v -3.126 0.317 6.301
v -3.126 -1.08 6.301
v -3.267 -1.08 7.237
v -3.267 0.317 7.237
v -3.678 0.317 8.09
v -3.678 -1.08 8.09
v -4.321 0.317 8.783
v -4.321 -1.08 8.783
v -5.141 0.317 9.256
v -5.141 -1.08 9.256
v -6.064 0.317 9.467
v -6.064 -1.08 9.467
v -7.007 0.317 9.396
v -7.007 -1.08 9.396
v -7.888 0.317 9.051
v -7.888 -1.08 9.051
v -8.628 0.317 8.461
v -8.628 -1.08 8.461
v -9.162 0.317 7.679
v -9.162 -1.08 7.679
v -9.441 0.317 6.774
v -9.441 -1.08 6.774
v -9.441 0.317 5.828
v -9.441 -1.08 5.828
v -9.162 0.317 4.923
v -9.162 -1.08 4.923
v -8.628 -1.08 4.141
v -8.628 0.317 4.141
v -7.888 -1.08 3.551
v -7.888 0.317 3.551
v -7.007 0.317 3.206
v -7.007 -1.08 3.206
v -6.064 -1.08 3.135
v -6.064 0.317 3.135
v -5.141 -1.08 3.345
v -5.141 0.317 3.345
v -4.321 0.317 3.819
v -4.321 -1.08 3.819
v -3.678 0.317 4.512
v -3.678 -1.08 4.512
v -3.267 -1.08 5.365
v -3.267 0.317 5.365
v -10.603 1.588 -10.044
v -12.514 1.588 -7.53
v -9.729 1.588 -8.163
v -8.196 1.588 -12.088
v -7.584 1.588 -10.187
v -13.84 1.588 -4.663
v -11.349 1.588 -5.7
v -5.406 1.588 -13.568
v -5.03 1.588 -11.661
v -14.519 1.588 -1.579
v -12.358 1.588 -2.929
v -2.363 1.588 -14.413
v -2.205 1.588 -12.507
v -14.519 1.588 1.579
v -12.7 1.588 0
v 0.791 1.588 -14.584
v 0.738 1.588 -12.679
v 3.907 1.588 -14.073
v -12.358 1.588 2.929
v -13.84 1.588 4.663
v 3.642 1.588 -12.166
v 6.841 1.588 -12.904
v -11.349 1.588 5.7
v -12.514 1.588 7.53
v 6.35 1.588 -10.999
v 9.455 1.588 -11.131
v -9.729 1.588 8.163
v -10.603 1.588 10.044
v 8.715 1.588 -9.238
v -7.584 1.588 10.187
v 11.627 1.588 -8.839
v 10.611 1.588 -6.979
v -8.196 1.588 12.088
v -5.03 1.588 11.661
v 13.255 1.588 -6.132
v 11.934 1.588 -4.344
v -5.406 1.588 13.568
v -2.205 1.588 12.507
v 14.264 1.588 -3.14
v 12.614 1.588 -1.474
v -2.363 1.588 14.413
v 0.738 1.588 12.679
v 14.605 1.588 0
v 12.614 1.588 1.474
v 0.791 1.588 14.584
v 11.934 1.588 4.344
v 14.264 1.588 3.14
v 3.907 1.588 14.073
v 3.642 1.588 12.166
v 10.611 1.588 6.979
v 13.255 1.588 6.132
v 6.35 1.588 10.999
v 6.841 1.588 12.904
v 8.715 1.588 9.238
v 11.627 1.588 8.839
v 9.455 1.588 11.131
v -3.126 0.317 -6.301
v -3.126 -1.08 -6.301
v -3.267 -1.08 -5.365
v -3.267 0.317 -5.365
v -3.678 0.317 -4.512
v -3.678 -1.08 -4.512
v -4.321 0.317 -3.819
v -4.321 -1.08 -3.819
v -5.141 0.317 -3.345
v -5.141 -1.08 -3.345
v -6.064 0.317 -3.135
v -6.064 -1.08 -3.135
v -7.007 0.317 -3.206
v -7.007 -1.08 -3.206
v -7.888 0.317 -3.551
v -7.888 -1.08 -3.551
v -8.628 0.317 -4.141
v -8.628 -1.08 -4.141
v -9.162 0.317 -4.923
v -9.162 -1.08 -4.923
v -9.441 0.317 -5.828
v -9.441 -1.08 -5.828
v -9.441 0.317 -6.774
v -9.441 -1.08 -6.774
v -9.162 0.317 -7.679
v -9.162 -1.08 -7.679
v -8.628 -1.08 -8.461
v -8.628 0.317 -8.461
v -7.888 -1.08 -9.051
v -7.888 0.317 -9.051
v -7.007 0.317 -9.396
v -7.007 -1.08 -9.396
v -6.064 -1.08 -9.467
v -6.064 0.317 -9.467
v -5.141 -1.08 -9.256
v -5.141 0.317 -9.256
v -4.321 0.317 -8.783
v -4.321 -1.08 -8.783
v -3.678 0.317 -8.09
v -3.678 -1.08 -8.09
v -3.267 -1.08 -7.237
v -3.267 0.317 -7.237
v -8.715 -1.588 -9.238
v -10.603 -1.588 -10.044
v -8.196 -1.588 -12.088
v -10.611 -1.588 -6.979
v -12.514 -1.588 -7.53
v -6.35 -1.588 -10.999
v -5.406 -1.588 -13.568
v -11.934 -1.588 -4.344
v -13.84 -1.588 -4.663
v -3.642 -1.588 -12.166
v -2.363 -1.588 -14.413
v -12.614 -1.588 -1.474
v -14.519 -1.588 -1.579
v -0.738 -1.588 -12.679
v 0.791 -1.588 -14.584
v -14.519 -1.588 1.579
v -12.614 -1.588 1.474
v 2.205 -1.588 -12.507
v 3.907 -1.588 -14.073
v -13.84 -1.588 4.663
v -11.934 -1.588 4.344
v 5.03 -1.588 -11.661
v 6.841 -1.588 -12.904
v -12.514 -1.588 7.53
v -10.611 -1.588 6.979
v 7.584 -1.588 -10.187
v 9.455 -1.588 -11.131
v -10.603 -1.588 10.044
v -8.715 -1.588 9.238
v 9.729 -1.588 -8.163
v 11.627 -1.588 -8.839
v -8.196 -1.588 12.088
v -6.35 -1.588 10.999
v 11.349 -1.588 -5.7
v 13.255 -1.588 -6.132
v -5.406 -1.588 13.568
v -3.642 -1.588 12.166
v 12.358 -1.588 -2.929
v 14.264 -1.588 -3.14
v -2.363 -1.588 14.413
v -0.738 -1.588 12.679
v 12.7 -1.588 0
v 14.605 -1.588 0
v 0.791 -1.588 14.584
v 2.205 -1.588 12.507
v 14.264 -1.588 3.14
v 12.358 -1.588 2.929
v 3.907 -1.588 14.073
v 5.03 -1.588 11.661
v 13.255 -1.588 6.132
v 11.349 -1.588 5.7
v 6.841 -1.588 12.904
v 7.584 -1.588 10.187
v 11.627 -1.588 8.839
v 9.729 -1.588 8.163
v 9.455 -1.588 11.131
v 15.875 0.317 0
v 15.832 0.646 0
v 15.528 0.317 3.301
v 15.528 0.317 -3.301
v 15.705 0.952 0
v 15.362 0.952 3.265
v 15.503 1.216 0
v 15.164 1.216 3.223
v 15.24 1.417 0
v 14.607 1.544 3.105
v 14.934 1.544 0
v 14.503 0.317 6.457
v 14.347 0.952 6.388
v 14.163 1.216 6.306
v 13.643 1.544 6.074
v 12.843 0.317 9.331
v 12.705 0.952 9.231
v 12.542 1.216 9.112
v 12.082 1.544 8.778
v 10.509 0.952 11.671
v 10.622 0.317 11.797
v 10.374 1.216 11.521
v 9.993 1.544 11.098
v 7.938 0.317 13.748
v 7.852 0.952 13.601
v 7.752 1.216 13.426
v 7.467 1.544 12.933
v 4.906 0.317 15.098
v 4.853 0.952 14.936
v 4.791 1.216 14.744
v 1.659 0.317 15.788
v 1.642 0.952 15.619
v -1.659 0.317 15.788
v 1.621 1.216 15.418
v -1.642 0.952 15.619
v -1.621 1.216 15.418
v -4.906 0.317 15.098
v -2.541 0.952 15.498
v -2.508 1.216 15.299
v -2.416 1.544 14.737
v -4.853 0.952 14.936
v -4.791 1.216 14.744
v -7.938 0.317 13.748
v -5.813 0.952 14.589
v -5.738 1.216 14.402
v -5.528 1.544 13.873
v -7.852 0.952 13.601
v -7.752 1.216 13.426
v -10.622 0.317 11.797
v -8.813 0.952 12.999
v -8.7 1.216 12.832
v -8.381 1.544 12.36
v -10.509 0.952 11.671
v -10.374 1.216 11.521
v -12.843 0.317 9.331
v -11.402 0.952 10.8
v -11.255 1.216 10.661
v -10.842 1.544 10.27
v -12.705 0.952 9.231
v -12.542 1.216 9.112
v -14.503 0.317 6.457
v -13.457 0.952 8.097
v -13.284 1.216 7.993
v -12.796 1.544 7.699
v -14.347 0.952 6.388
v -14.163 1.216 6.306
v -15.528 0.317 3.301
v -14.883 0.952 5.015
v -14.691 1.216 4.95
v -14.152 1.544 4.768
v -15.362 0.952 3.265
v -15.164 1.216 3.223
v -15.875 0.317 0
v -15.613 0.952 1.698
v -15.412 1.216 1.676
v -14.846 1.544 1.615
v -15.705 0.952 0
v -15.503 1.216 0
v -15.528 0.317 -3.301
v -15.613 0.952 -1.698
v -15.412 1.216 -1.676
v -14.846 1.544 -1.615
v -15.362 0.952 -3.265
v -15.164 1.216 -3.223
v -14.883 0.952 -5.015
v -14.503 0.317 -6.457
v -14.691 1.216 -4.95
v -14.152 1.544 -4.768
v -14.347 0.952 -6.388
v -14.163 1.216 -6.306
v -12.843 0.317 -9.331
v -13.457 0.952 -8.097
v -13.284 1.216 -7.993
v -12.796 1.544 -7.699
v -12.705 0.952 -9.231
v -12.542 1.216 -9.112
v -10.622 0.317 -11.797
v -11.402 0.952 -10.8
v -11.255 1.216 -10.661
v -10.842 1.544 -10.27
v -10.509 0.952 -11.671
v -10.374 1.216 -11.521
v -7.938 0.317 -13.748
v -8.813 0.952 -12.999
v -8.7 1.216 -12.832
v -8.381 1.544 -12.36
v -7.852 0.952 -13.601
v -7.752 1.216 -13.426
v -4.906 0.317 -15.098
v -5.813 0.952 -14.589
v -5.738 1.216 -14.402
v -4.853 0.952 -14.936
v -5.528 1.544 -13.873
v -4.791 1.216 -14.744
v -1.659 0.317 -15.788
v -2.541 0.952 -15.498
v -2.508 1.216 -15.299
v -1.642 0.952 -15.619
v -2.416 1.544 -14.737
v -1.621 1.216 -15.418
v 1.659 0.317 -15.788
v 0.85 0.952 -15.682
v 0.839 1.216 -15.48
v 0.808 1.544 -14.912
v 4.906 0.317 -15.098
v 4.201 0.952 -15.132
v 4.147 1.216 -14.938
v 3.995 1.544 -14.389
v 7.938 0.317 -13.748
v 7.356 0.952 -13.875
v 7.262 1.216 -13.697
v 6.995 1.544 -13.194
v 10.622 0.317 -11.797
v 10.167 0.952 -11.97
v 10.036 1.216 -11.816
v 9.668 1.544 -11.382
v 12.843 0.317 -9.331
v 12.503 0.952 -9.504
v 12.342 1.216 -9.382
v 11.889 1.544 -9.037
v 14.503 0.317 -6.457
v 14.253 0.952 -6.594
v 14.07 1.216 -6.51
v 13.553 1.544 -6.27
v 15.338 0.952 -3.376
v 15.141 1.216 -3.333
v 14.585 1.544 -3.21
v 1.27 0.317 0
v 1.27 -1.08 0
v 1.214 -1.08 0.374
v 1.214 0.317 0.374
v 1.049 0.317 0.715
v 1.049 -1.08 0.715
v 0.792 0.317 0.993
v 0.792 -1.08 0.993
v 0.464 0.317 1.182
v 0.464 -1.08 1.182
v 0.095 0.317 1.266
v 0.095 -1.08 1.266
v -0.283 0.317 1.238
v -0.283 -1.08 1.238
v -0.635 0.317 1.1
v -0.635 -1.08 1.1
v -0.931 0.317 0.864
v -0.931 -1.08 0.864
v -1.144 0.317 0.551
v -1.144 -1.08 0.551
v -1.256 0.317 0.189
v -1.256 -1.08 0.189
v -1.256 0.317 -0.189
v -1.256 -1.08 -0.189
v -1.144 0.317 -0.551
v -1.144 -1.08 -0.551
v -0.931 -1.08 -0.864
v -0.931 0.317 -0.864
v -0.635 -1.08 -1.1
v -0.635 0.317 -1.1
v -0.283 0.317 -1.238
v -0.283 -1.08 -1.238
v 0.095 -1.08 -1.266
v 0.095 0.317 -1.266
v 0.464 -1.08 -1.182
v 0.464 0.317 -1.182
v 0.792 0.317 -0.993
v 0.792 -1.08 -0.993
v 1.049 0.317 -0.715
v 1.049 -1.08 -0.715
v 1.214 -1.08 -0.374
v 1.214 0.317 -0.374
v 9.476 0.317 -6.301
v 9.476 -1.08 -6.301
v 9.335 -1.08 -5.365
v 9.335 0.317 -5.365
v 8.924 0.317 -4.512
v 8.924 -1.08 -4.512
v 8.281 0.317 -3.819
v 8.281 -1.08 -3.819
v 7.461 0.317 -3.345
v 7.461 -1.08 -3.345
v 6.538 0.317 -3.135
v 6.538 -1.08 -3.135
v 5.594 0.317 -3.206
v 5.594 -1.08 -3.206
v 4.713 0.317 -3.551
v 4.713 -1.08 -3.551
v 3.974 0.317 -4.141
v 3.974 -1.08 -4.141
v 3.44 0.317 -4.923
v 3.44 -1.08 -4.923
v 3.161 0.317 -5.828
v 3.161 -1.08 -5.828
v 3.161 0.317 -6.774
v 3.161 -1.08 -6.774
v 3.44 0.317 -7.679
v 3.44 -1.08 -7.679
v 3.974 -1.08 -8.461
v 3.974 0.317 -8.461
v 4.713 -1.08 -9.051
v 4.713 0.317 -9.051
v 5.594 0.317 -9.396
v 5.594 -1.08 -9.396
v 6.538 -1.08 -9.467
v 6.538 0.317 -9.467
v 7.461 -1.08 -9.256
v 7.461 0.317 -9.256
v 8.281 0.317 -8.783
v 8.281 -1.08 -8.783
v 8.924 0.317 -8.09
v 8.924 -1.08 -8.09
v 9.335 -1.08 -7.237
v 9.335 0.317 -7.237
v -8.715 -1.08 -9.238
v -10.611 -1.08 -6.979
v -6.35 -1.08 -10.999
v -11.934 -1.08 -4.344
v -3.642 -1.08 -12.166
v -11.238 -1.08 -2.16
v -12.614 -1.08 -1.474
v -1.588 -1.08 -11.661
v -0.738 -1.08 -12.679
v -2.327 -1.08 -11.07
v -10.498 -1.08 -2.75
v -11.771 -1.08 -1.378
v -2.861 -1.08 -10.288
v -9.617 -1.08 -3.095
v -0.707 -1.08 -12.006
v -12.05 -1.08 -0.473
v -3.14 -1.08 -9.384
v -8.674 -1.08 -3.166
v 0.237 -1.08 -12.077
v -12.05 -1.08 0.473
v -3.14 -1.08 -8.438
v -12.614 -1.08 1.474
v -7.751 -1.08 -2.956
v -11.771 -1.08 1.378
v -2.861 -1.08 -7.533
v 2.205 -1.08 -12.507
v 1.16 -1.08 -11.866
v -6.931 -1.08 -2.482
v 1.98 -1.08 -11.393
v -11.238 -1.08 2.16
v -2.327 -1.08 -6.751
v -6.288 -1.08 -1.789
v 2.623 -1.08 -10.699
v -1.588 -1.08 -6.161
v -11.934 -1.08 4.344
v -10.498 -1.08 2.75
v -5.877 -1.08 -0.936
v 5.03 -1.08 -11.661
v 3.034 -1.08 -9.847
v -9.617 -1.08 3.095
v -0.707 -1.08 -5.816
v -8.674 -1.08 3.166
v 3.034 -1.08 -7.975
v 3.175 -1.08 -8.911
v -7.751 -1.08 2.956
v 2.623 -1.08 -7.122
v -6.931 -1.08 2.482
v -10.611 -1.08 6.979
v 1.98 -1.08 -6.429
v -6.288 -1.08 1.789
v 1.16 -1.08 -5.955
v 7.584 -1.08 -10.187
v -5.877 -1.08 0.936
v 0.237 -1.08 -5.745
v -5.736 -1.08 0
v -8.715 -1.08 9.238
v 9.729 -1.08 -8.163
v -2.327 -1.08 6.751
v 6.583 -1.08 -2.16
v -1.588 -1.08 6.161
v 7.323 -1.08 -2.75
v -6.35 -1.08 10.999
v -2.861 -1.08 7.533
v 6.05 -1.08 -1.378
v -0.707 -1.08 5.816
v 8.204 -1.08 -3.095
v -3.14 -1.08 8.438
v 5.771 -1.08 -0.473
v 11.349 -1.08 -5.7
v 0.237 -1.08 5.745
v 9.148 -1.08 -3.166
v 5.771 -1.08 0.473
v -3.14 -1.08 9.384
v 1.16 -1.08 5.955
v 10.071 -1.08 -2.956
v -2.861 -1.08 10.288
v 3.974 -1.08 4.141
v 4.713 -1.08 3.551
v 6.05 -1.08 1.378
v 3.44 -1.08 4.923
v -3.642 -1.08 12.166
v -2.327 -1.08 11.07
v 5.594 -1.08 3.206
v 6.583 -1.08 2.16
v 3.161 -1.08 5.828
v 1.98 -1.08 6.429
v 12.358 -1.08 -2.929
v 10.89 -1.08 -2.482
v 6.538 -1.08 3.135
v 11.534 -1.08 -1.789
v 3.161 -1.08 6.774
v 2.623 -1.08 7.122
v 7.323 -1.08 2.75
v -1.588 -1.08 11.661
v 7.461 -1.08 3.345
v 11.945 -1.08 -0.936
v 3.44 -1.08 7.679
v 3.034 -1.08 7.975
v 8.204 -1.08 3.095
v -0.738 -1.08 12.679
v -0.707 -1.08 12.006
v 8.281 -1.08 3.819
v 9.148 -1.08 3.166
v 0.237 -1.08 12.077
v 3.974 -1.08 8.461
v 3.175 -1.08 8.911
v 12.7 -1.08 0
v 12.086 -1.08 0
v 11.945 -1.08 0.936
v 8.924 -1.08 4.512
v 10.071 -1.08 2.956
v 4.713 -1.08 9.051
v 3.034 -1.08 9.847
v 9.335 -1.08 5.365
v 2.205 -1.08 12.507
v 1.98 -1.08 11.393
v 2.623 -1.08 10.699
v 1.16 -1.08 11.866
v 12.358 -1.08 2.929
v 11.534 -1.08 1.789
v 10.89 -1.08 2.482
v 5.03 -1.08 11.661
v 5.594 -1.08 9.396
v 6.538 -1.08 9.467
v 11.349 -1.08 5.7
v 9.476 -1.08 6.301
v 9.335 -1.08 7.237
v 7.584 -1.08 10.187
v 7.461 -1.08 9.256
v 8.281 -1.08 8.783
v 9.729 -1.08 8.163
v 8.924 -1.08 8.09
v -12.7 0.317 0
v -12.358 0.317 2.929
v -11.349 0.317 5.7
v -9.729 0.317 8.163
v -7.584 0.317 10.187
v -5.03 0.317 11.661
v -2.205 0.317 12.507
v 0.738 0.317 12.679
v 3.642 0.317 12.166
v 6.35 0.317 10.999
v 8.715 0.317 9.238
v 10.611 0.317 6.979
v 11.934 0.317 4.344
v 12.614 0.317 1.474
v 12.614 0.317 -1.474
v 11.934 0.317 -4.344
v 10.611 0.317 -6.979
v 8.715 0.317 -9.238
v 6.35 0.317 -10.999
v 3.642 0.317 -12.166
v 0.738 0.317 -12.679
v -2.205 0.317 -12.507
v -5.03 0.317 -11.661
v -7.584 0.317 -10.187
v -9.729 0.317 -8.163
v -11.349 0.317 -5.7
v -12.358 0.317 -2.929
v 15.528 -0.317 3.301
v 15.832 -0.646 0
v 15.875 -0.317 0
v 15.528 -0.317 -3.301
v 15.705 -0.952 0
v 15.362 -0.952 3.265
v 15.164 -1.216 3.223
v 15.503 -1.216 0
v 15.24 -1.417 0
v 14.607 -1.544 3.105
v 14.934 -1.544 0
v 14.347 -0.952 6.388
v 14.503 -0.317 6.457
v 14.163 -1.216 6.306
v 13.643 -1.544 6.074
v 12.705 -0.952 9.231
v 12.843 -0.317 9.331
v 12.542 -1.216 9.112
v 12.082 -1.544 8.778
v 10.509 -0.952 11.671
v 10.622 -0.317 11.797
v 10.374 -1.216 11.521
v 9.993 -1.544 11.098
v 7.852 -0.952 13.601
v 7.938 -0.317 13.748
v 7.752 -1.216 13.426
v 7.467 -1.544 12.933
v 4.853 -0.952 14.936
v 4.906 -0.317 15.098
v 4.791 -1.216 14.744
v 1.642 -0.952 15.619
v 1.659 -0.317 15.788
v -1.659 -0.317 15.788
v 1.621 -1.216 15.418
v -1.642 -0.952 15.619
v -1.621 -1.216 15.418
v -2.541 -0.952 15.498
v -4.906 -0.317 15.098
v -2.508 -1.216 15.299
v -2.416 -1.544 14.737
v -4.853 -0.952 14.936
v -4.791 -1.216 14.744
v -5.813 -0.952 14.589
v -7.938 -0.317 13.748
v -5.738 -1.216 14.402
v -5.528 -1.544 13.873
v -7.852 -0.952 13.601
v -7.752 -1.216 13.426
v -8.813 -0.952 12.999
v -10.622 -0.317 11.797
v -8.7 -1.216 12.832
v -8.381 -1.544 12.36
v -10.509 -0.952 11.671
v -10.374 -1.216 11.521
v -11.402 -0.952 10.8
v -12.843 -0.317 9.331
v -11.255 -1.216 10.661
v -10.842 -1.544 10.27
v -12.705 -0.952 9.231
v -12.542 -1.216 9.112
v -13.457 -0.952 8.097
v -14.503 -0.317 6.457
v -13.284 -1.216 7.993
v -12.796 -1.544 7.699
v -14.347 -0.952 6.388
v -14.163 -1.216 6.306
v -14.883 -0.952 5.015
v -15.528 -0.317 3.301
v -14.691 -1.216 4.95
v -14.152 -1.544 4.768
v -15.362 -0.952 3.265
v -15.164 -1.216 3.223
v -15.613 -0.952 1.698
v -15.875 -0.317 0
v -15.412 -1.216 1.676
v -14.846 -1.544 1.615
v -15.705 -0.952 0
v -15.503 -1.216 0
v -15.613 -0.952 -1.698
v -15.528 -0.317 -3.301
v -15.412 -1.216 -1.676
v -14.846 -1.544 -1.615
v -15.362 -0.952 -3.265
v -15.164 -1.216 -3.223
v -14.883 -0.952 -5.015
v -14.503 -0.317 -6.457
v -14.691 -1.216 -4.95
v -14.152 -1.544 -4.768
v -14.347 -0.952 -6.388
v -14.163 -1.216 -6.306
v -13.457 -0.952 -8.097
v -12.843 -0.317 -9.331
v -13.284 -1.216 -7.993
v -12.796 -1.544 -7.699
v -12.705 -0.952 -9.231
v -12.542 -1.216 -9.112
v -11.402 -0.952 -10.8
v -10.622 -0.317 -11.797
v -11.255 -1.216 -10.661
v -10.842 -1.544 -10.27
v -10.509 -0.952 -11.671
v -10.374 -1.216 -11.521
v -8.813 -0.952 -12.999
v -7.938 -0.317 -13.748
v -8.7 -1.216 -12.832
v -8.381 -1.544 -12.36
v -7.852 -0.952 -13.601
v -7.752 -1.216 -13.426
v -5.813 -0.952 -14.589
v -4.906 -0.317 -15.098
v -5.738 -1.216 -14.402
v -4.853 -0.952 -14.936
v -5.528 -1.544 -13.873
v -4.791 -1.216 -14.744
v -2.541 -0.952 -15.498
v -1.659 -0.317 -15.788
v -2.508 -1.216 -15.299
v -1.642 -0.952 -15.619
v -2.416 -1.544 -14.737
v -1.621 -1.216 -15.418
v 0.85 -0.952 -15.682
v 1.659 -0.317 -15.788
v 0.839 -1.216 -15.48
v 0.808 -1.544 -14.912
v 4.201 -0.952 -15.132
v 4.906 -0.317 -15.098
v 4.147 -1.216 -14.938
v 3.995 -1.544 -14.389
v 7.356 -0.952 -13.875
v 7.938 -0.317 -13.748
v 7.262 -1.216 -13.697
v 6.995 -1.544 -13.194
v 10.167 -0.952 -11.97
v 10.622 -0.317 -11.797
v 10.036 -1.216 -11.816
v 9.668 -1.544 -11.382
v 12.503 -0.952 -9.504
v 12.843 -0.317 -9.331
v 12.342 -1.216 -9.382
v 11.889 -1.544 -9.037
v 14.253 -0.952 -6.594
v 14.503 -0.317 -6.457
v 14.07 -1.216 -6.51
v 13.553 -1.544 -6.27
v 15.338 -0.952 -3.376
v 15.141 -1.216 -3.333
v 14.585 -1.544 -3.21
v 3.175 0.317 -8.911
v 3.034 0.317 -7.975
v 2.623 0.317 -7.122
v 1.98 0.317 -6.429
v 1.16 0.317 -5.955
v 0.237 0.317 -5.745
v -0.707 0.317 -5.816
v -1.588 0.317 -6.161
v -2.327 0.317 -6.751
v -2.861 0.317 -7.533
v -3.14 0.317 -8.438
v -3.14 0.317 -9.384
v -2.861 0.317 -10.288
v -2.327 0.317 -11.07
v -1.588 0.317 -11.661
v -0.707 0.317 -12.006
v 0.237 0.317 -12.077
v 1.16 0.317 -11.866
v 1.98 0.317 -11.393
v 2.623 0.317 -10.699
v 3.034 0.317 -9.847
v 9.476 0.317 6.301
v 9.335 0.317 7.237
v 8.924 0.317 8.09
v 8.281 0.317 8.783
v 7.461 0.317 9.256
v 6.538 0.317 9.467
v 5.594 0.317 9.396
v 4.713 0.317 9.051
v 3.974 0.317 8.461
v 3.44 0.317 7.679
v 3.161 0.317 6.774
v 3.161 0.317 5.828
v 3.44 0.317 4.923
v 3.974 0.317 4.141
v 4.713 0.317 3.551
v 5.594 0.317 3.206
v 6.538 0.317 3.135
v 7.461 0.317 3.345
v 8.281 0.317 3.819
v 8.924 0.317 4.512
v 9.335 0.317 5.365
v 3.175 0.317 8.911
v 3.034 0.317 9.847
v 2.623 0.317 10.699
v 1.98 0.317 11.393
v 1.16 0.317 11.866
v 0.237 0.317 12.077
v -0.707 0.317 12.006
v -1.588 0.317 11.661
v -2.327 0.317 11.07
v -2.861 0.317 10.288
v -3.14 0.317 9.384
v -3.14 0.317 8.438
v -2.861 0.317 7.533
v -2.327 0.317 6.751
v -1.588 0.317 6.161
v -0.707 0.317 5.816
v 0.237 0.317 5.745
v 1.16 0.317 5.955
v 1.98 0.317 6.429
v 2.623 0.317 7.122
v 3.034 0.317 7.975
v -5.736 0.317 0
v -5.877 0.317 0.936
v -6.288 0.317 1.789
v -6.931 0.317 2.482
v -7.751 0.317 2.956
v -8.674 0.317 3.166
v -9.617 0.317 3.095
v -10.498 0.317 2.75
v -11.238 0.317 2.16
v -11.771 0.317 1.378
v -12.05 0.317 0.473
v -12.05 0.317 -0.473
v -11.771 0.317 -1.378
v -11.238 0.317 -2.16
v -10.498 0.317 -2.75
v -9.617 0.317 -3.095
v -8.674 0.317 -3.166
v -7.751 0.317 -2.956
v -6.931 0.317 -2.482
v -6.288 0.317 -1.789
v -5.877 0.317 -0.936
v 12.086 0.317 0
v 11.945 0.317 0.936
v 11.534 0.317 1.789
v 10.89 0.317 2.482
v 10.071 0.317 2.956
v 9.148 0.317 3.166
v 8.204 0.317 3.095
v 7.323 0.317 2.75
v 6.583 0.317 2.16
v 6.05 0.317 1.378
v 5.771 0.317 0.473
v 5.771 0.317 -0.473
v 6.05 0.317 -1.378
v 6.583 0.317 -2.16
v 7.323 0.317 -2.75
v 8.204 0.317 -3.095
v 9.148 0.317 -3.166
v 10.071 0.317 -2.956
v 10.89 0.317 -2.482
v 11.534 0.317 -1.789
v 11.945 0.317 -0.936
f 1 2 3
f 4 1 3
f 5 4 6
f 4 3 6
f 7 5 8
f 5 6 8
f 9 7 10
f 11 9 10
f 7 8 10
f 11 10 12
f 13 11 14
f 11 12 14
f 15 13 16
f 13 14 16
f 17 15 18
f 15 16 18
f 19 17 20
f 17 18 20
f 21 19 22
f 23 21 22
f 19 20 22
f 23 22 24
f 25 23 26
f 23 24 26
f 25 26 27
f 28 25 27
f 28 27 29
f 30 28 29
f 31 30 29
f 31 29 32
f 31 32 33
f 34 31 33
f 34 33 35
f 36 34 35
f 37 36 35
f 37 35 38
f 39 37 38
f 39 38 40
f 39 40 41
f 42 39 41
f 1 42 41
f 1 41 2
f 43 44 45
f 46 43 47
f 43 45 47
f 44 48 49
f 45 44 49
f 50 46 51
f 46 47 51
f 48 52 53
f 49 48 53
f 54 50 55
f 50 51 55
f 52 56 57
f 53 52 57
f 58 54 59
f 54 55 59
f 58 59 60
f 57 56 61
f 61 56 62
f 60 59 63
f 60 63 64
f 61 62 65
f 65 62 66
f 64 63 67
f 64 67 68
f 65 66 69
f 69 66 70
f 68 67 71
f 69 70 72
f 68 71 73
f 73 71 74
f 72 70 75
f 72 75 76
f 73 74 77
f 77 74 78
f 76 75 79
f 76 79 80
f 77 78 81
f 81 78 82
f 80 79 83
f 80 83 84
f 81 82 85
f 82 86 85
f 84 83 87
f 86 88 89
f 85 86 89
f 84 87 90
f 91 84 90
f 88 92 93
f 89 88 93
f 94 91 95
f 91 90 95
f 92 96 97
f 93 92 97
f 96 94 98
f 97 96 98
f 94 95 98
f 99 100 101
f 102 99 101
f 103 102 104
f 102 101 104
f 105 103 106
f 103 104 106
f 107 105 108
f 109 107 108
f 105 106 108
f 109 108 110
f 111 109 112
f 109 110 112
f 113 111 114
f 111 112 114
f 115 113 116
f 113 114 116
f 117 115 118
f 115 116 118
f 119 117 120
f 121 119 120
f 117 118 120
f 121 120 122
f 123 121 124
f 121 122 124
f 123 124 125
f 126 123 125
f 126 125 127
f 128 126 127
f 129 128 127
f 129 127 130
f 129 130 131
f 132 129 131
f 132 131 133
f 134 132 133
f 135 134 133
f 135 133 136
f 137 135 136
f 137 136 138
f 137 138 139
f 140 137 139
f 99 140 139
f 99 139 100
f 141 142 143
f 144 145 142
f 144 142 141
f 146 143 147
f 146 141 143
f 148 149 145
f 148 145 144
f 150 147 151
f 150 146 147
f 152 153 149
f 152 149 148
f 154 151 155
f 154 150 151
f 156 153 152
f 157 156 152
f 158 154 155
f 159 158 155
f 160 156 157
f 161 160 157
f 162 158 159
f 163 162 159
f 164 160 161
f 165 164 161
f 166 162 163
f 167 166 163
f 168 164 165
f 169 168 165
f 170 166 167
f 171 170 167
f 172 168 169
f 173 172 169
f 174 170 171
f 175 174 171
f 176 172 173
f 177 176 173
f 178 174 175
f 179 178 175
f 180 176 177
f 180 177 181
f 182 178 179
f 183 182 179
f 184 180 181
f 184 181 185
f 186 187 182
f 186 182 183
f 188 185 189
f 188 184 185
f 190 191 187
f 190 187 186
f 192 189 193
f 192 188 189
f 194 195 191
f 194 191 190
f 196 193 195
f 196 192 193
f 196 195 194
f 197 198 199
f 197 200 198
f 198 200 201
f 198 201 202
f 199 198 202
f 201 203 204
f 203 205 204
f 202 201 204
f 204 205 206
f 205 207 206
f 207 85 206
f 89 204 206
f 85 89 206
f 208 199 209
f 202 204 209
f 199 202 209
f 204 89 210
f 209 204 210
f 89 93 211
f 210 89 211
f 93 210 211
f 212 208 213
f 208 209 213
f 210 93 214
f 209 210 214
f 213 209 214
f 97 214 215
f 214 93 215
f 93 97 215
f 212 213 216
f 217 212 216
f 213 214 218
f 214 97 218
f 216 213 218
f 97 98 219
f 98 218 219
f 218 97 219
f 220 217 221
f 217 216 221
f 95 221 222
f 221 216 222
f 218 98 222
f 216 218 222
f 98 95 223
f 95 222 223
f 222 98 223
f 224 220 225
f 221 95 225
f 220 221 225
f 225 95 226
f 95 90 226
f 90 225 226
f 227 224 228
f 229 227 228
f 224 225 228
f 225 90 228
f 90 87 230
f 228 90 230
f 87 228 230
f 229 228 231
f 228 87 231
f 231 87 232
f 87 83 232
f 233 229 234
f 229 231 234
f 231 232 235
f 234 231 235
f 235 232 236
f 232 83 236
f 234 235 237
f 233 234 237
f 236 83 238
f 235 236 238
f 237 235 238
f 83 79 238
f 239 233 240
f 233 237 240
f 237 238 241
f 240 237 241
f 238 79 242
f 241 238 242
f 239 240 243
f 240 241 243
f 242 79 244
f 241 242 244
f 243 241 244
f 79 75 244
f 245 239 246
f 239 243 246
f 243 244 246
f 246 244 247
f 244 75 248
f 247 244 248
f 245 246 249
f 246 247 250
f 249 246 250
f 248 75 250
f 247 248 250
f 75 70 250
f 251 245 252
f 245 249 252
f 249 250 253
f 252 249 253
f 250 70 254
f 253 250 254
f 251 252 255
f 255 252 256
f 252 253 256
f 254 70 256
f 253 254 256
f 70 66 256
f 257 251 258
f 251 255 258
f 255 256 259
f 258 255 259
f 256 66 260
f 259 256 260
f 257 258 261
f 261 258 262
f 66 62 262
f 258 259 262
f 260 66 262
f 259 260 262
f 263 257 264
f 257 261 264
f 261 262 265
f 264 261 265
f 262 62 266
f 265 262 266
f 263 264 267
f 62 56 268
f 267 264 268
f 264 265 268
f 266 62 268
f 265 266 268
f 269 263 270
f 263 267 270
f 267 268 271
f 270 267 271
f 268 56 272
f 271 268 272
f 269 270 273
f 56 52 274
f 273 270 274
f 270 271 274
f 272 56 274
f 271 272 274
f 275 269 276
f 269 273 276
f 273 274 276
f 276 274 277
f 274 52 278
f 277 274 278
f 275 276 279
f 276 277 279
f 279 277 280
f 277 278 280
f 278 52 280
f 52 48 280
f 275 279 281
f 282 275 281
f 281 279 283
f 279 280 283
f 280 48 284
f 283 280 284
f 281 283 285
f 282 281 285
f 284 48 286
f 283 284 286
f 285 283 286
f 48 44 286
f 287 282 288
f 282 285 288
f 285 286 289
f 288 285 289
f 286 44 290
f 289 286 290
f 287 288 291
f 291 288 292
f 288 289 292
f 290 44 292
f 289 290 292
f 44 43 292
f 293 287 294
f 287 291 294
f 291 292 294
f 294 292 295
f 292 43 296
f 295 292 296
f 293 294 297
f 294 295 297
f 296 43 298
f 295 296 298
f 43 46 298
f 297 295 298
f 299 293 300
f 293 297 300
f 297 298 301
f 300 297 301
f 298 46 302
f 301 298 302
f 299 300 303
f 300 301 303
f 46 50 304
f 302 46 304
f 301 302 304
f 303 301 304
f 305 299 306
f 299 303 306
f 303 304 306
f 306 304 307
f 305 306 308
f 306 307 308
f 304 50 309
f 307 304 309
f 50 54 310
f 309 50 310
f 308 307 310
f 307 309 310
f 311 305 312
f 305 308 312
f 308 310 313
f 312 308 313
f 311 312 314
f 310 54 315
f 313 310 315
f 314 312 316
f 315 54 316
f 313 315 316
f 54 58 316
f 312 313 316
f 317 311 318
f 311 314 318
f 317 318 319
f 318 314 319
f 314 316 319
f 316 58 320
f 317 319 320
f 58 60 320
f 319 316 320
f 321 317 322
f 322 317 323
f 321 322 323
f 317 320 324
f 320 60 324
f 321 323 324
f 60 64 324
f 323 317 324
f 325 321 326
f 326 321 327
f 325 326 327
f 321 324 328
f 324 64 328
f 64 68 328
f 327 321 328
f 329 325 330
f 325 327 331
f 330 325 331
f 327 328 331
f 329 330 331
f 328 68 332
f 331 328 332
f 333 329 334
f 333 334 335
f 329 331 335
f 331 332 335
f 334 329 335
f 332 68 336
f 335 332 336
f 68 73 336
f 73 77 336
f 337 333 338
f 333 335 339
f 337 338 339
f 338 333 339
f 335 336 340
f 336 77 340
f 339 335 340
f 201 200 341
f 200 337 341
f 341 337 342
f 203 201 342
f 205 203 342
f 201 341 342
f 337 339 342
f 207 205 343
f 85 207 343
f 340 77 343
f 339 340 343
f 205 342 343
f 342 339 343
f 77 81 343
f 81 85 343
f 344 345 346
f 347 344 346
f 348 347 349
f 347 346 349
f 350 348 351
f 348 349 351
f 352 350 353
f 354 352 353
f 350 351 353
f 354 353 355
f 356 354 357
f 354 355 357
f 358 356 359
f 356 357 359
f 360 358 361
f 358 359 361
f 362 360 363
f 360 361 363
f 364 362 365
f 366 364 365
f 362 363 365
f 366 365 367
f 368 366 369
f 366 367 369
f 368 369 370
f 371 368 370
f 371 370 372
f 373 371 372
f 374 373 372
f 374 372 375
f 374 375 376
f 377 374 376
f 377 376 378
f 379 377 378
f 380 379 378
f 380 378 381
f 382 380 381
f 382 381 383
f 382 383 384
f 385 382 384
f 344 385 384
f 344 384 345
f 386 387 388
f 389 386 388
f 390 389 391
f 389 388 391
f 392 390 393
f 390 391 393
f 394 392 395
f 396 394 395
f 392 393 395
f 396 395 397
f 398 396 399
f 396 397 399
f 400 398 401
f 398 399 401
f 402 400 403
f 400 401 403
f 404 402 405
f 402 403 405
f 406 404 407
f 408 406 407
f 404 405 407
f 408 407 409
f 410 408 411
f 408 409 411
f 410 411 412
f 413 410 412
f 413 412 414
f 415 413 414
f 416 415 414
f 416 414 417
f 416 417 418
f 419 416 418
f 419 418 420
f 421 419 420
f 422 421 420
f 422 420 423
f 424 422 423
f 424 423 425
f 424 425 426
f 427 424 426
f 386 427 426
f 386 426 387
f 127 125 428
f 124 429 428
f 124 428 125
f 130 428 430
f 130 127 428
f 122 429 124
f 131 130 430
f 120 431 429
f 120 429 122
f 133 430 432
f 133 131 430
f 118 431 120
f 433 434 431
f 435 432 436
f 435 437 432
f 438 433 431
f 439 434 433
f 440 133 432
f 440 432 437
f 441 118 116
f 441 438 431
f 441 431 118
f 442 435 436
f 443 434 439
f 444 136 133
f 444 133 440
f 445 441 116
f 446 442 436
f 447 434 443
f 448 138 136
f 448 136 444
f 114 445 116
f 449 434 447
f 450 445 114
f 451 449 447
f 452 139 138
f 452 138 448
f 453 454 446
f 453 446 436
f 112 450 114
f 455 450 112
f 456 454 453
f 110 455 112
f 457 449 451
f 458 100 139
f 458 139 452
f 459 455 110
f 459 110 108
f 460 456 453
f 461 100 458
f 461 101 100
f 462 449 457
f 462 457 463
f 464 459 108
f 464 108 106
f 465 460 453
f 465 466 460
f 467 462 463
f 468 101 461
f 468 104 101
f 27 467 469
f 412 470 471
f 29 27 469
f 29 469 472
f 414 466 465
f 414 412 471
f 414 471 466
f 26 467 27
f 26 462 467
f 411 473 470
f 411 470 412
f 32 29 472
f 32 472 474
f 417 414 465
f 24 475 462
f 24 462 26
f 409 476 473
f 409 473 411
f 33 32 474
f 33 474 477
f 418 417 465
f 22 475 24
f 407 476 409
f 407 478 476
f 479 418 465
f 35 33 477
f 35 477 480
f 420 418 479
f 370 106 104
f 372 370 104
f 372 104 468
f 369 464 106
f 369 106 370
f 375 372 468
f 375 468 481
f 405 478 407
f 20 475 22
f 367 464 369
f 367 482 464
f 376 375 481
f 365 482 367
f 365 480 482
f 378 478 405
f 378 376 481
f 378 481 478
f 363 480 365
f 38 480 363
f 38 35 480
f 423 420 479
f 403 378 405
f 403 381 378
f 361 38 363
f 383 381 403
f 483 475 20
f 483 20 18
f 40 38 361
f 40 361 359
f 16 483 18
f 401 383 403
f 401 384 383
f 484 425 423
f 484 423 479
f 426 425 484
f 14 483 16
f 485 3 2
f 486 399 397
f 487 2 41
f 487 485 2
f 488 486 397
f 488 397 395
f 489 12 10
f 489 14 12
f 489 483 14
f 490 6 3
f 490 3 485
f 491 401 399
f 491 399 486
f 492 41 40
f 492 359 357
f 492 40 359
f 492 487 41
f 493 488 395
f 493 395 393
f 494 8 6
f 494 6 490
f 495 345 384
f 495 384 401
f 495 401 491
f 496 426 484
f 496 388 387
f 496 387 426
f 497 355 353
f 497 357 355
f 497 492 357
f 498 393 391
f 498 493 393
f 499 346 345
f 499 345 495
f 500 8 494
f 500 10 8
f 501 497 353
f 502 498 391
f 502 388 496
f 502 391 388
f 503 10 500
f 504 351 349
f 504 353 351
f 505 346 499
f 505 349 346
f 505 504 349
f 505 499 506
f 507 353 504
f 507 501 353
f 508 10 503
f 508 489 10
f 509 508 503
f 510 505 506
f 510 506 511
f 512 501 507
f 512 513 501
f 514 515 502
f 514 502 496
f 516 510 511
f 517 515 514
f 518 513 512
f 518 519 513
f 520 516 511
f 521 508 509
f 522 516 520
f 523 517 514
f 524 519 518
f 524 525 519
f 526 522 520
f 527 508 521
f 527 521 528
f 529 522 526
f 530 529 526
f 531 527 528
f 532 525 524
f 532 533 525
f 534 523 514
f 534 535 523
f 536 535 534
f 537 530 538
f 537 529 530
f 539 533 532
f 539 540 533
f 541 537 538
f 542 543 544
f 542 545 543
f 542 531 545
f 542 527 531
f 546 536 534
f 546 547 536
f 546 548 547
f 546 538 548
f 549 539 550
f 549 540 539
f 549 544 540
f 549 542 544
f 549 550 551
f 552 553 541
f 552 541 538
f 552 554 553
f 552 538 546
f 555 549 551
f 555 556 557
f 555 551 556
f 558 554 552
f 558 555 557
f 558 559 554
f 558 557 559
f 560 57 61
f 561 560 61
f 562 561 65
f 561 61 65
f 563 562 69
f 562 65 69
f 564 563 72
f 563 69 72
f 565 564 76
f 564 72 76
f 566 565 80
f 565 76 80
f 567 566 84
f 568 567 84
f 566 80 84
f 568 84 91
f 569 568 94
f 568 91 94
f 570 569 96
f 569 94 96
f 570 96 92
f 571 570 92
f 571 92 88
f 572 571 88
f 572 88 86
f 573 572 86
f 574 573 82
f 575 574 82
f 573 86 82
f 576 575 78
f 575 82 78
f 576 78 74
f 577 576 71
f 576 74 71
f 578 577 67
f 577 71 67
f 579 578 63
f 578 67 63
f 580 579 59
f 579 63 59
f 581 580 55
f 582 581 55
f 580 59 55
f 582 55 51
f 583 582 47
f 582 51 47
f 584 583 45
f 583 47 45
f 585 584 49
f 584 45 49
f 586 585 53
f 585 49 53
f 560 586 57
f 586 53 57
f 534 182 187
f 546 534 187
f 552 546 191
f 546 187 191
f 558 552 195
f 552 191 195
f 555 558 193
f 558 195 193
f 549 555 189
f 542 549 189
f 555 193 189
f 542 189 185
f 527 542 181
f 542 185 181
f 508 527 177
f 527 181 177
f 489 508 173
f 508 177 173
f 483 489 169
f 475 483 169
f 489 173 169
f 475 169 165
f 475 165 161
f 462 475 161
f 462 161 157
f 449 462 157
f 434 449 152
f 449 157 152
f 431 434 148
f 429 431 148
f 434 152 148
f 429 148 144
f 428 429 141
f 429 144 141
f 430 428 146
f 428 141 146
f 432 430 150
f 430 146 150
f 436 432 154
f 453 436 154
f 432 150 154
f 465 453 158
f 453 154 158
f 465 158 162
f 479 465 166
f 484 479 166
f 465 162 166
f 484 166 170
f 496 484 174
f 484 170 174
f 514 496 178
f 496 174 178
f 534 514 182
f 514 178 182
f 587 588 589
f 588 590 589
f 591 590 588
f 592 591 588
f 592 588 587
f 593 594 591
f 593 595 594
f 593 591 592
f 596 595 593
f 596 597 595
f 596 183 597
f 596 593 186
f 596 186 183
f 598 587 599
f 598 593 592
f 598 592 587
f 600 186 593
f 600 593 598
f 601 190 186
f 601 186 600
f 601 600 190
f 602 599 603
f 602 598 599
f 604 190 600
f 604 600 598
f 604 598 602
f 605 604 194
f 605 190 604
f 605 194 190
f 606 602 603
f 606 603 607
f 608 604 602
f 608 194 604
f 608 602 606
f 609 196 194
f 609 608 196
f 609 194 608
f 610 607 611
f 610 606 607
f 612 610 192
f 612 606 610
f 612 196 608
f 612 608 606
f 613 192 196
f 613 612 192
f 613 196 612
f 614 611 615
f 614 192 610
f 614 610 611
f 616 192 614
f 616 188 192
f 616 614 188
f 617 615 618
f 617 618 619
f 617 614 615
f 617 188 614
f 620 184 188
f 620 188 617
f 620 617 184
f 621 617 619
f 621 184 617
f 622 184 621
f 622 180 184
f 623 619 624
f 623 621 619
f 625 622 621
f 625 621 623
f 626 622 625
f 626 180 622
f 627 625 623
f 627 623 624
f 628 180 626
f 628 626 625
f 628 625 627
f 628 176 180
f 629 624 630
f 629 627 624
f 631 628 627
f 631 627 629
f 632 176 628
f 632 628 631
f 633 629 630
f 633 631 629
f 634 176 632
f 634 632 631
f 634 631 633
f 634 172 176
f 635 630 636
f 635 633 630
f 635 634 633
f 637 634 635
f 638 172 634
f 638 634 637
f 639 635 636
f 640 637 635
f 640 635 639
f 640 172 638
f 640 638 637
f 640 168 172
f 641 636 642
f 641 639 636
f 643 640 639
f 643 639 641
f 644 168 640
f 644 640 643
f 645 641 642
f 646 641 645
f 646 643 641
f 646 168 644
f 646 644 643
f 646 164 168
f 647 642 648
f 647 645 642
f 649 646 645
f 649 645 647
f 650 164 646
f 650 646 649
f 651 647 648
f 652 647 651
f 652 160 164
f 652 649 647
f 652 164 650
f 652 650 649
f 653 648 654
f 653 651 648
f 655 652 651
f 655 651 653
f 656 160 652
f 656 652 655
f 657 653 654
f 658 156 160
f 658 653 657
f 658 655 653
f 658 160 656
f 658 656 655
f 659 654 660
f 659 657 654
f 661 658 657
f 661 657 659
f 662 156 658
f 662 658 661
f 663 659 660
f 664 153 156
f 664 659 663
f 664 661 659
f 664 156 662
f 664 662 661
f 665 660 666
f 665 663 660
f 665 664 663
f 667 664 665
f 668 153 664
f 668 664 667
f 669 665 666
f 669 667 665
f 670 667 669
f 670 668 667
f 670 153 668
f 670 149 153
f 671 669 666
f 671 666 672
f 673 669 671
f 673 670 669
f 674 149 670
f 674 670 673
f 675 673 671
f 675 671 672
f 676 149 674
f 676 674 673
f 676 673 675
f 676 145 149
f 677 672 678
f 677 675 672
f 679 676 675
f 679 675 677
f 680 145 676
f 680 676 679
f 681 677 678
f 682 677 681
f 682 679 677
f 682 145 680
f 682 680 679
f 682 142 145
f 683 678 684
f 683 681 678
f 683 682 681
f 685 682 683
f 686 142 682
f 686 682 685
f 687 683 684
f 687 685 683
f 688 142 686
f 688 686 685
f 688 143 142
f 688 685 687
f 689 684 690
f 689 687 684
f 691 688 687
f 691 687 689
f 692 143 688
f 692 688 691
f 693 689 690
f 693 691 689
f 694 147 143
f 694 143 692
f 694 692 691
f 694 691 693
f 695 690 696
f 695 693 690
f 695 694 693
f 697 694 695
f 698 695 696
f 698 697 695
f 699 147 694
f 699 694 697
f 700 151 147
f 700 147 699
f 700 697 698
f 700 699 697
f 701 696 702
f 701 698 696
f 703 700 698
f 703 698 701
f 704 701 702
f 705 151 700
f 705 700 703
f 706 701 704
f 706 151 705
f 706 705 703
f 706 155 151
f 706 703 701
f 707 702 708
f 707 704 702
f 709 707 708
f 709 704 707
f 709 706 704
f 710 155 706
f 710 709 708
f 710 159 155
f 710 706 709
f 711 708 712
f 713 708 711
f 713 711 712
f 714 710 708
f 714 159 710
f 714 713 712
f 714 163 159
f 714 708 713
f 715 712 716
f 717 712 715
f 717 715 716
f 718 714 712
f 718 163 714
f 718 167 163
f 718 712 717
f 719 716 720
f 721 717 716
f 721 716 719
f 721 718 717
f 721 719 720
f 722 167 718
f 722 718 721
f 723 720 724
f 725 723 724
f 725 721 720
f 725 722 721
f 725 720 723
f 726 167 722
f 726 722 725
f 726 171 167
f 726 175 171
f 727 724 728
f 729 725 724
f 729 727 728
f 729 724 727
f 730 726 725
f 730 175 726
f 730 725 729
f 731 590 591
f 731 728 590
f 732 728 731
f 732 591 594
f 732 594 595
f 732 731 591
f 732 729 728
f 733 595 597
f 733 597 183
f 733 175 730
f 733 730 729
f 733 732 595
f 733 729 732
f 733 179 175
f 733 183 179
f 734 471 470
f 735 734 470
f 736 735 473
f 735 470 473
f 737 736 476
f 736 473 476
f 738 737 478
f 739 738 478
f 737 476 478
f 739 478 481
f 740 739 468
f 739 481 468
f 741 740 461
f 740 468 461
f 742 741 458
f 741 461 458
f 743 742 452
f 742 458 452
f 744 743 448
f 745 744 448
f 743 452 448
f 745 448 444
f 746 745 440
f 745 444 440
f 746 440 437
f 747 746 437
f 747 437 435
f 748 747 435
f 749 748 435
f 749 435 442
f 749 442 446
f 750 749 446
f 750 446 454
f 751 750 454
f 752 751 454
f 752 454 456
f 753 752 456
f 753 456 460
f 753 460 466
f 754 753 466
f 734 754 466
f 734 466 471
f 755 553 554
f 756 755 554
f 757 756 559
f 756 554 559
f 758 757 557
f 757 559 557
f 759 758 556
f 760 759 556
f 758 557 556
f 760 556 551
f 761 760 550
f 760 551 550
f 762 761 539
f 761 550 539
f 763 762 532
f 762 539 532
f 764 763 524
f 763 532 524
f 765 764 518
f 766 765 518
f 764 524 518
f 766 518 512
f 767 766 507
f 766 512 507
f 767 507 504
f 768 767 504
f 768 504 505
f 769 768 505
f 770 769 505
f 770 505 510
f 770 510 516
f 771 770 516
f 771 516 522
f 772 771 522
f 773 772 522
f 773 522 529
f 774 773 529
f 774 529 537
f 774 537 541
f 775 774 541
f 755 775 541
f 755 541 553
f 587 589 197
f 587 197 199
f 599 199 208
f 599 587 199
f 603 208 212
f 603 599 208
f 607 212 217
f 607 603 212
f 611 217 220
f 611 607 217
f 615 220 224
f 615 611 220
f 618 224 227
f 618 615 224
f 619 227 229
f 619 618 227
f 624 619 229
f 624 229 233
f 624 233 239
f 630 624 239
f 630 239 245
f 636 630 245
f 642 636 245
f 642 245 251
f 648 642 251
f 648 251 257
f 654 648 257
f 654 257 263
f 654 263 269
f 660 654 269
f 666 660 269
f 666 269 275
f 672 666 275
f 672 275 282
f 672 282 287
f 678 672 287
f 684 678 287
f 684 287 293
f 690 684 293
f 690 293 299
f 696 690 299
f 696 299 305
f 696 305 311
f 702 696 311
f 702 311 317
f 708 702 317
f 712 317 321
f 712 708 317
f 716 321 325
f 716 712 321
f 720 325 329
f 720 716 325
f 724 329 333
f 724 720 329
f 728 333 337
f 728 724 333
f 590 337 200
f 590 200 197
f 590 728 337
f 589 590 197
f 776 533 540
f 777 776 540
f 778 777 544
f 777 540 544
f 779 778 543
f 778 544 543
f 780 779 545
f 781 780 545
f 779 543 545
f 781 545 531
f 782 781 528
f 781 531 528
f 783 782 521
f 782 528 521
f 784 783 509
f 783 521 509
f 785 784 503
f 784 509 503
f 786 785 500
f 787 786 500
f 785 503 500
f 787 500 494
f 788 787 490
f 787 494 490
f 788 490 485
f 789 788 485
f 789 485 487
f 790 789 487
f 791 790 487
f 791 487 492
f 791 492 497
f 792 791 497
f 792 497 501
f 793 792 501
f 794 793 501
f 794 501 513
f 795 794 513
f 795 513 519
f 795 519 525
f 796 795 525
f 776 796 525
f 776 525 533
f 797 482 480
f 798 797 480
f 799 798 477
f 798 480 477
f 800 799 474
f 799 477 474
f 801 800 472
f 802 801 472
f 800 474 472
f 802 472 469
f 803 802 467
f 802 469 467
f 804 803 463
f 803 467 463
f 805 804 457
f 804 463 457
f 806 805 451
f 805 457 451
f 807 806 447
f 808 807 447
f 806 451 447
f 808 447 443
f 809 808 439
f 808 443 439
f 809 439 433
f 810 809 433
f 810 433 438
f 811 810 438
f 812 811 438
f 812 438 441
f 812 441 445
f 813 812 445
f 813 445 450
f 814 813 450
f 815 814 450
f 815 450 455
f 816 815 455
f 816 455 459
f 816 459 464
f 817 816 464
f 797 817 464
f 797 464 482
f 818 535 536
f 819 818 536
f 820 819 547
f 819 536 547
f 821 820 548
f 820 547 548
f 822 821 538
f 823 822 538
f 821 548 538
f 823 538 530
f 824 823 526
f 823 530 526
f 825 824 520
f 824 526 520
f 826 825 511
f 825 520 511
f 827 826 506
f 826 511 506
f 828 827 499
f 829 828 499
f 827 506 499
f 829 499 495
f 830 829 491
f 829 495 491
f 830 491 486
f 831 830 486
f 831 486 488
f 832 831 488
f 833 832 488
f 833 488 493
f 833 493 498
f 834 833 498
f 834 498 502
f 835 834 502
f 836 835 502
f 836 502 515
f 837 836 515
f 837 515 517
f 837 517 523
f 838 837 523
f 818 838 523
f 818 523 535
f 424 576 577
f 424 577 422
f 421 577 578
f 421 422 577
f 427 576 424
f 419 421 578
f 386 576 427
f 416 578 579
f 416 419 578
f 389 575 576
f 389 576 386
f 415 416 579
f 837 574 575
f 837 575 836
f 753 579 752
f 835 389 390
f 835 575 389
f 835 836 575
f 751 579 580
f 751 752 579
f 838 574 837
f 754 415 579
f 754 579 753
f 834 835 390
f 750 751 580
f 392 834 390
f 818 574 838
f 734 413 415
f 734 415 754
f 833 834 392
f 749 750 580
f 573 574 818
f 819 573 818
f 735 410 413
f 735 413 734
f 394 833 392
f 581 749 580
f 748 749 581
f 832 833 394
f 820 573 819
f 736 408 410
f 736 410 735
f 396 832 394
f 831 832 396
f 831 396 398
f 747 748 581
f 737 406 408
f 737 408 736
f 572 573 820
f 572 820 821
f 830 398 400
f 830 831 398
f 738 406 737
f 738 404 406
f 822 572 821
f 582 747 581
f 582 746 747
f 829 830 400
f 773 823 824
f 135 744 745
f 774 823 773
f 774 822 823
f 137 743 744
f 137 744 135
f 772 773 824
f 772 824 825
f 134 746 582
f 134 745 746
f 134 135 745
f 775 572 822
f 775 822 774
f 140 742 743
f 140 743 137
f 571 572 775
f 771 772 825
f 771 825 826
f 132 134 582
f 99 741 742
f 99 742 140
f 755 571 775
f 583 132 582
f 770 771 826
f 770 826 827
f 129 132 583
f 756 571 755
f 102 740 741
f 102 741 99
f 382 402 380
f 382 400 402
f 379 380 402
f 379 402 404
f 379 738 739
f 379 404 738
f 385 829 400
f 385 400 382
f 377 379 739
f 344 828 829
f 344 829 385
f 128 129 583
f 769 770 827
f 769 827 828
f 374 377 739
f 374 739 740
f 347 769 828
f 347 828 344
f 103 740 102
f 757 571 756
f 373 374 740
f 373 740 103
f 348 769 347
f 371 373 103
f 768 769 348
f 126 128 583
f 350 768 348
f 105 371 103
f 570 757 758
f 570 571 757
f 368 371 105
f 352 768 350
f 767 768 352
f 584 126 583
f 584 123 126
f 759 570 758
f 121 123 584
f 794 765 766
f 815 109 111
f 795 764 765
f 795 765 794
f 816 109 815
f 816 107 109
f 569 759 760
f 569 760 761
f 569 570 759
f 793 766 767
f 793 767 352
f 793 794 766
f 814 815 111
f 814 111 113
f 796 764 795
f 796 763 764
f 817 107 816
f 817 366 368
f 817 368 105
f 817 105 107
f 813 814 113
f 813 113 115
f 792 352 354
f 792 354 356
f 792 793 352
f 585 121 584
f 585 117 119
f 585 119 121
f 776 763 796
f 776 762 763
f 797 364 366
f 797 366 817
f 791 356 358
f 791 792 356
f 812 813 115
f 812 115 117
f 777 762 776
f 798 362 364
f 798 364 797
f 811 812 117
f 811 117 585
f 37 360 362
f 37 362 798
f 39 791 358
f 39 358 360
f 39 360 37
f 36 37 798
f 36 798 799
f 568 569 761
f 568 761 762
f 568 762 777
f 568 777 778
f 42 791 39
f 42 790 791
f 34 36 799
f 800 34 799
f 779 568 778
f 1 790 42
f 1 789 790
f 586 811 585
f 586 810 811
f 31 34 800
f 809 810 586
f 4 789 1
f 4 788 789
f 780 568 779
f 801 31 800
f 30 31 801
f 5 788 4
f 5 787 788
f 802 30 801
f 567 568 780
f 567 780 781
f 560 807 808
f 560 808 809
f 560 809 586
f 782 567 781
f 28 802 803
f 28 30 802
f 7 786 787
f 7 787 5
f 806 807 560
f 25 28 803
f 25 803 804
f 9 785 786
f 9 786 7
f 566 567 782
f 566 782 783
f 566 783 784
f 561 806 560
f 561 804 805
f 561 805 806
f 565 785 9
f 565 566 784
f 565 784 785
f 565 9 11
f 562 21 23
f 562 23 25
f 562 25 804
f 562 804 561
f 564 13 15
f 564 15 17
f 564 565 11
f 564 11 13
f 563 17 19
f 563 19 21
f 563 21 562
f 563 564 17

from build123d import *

# Parameters (mm, degrees)
F0_R     = 15.875
F1_DEPTH = 1.5875
F2_R     = 12.7
F3_DEPTH = 0.508
F4_R     = 12.7
F5_DEPTH = 1.27
F6_R     = 1.27
F7_DEPTH = 2.668
F8_R     = 3.175
F9_DEPTH = 2.668
F10_R    = 1.27


with BuildPart() as f1:
    # F0 (on Front) → F1 (new body, symmetric)
    with BuildSketch(Plane.XZ):
        Circle(F0_R)
    extrude(amount=F1_DEPTH, both=True)

    # F2 (on face) → F3 (cut)
    with BuildSketch(Plane.XZ.offset(1.5875)):
        Circle(F2_R)
    extrude(amount=-F3_DEPTH, mode=Mode.SUBTRACT)

    # F4 (on face) → F5 (cut)
    with BuildSketch(Plane(origin=(0, 1.5875, 0), x_dir=(-1, 0, 0), z_dir=(0, 1, 0))):
        Circle(F4_R)
    extrude(amount=-F5_DEPTH, mode=Mode.SUBTRACT)

    # F6 (on face) → F7 (cut, through all)
    with BuildSketch(Plane.XZ.offset(1.0795)):
        Circle(F6_R)
    extrude(amount=-F7_DEPTH, mode=Mode.SUBTRACT)

    # F8 (on face) → F9 (cut, through all)
    with BuildSketch(Plane.XZ.offset(1.0795)):
        with Locations((0, 8.9109085647)):
            Circle(F8_R)
        with Locations((-6.3009638726, 6.3009638726)):
            Circle(F8_R)
        with Locations((-8.9109085647, 0)):
            Circle(F8_R)
        with Locations((-6.3009638726, -6.3009638726)):
            Circle(F8_R)
        with Locations((0, -8.9109085647)):
            Circle(F8_R)
        with Locations((6.3009638726, -6.3009638726)):
            Circle(F8_R)
        with Locations((8.9109085647, 0)):
            Circle(F8_R)
        with Locations((6.3009638726, 6.3009638726)):
            Circle(F8_R)
    extrude(amount=-F9_DEPTH, mode=Mode.SUBTRACT)

    # F10
    f10_edges = [f1.edges().sort_by_distance(p)[0] for p in [
        (-15.875, -1.5875, 0),
        (-15.875, 1.5875, 0),
        (15.875, 0, 0),
    ]]
    fillet(f10_edges, radius=F10_R)


solid = f1.part
